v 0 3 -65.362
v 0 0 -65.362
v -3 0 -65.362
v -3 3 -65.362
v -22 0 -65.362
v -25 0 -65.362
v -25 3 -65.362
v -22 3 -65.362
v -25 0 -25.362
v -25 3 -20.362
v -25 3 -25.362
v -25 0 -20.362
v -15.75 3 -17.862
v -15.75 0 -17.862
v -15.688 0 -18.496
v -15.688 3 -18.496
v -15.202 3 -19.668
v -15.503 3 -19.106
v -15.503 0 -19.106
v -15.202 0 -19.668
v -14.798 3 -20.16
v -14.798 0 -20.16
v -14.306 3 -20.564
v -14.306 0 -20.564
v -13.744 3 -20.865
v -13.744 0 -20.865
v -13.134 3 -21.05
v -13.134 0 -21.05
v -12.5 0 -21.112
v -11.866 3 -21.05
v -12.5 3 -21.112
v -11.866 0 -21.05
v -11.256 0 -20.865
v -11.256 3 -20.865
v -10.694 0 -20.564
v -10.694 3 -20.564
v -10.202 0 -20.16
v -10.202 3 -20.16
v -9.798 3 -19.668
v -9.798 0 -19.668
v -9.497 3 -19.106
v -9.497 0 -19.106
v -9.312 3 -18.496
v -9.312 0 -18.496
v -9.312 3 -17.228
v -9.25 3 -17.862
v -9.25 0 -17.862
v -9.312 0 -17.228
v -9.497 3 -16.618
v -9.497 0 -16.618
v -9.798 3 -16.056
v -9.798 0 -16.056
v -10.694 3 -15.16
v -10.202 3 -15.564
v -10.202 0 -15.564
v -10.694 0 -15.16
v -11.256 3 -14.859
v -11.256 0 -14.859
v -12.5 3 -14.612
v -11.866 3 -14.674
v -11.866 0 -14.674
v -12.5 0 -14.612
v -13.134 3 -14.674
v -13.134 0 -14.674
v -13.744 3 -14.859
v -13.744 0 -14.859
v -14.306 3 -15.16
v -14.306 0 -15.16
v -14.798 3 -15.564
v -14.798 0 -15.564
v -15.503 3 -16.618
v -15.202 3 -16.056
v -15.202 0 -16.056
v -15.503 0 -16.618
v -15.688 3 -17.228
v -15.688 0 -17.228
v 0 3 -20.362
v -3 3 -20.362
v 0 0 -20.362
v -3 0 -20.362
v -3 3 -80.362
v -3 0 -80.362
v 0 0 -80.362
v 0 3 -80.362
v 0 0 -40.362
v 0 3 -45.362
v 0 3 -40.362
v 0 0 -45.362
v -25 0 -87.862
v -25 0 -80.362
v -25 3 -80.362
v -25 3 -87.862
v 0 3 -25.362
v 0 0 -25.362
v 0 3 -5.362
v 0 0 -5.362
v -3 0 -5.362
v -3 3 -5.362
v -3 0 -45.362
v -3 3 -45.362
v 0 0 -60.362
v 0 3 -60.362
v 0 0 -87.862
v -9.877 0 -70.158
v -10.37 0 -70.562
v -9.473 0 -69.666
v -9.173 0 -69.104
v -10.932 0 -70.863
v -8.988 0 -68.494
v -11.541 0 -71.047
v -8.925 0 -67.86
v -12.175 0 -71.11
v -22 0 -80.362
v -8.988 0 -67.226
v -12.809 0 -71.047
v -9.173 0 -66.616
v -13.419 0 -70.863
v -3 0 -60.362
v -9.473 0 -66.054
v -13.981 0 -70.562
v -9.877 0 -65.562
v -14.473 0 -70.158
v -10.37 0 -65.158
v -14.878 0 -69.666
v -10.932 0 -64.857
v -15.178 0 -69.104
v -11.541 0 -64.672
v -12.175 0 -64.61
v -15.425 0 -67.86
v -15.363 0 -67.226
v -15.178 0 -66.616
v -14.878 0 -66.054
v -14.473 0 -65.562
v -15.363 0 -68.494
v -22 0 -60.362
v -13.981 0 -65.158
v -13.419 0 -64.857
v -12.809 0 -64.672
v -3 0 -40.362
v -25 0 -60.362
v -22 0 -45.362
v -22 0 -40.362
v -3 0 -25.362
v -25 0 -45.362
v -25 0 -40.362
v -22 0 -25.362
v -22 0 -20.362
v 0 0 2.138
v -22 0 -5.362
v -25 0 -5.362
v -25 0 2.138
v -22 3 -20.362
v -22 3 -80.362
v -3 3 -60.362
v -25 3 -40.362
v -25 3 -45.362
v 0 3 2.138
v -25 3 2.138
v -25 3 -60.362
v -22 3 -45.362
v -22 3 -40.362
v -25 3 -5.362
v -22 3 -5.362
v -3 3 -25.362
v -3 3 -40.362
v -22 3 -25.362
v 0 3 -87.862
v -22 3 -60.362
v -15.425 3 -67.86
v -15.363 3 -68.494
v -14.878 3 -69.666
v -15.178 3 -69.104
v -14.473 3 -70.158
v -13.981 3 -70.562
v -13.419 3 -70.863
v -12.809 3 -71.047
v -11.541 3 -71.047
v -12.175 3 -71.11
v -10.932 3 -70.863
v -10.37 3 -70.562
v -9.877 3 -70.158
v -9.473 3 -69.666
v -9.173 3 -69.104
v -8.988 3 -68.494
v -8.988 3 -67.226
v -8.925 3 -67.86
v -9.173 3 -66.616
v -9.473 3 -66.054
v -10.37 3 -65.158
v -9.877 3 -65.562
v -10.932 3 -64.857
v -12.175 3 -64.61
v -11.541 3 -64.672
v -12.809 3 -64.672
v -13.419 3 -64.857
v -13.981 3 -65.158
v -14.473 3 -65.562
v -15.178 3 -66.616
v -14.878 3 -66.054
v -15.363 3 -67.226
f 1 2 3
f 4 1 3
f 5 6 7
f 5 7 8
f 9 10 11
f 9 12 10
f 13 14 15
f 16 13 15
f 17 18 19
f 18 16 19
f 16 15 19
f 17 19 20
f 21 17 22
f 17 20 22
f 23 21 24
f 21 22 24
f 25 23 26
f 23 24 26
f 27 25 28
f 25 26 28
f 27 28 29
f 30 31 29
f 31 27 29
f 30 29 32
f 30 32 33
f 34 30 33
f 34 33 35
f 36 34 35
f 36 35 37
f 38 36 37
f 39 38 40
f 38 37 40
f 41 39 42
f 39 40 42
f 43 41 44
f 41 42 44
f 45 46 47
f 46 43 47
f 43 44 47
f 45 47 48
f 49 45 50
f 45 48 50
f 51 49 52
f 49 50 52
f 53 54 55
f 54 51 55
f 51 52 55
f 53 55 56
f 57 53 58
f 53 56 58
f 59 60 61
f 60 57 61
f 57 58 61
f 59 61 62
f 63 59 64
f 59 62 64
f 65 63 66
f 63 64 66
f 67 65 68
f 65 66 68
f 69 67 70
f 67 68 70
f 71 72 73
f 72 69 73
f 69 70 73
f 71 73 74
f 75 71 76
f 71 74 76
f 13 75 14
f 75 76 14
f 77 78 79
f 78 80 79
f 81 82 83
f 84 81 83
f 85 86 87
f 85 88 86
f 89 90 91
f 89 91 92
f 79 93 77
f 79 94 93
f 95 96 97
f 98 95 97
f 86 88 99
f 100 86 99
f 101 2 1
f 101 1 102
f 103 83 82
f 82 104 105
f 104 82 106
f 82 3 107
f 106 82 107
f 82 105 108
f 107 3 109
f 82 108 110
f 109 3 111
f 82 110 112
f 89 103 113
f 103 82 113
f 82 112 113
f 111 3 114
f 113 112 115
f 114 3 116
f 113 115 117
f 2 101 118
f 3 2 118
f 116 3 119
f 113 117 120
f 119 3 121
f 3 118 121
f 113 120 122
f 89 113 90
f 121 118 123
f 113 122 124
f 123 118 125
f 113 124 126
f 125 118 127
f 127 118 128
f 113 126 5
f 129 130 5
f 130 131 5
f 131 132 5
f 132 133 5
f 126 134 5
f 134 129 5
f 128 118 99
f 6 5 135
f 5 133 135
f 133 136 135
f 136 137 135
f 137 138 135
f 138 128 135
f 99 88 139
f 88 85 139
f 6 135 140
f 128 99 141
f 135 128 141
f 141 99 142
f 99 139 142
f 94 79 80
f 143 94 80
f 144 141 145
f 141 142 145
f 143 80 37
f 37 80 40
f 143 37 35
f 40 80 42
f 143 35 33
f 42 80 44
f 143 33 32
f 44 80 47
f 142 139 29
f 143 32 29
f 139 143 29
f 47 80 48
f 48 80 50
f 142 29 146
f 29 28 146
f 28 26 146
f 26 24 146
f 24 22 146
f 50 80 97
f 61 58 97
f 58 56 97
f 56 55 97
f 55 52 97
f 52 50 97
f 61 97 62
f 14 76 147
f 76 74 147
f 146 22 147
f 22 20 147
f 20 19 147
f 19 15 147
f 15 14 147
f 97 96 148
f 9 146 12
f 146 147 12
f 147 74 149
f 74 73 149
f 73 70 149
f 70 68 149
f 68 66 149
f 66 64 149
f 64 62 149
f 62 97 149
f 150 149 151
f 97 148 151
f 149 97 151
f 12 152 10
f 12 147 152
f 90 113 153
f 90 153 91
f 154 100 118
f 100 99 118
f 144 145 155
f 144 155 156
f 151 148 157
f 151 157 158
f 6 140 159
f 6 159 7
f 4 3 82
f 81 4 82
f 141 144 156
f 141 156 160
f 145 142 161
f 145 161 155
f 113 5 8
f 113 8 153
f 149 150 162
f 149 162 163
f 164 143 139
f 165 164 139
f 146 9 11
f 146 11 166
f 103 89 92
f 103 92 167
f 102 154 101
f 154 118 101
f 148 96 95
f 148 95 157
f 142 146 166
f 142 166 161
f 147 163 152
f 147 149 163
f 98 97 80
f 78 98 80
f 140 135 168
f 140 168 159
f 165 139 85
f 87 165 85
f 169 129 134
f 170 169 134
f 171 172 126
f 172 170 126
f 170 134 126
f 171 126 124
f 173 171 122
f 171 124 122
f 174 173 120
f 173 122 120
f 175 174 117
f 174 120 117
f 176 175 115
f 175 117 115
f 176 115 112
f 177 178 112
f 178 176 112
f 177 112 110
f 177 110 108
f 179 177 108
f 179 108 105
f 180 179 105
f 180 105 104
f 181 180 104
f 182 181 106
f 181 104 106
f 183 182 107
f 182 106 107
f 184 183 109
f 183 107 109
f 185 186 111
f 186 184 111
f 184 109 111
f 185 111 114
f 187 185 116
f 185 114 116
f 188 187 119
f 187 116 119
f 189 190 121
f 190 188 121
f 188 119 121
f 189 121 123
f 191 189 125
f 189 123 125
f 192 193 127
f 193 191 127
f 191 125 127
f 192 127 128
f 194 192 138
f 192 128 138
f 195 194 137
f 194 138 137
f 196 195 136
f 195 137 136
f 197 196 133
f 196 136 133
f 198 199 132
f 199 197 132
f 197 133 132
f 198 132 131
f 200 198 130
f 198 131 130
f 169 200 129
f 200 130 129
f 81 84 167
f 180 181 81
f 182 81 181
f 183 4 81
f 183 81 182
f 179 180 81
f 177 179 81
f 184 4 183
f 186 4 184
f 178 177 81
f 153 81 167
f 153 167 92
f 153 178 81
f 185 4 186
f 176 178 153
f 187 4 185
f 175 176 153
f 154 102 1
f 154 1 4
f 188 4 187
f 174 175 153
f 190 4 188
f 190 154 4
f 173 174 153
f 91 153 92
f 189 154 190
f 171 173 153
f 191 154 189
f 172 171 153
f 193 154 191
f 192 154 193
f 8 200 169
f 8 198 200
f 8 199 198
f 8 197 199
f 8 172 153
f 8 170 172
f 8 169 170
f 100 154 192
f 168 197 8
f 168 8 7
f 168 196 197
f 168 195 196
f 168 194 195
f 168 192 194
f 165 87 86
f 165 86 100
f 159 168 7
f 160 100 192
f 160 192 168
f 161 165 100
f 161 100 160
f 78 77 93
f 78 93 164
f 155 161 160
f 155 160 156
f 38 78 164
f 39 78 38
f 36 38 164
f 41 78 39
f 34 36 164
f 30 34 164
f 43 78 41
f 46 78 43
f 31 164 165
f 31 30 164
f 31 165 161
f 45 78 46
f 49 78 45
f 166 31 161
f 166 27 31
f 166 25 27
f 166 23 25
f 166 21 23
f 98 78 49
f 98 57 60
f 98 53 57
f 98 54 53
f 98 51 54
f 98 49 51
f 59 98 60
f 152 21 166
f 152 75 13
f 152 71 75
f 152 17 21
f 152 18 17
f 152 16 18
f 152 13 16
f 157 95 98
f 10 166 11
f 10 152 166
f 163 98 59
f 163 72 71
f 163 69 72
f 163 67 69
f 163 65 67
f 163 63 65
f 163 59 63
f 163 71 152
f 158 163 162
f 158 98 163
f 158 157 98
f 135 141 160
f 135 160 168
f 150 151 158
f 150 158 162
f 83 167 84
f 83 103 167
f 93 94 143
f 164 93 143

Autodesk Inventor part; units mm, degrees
ref_plane "YZ Plane" through (0, 0, 0) normal (1, 0, 0) x (0, 1, 0)
ref_plane "XZ Plane" through (0, 0, 0) normal (0, 1, 0) x (-1, 0, 0)
ref_plane "XY Plane" through (0, 0, 0) normal (0, 0, 1) x (1, 0, 0)
sketch "Boceto1" plane through (0, 0, 0) normal (0, 1, 0) x (-1, 0, 0)
  line L0 (0, 2.138) -> (25, 2.138)
  line L1 (25, 2.138) -> (25, -87.862)
  line L2 (25, -87.862) -> (0, -87.862)
  line L3 (0, -87.862) -> (0, 2.138)
  line L4 (0, 2.138) -> (25, -87.862) construction
  line L5 (25, 2.138) -> (0, -87.862) construction
  circle A0 centre (12.5, -17.862) radius 3.25
  circle A1 centre (12.1754, -67.8599) radius 3.25
  line L6 (25, -5.362) -> (22, -5.362)
  line L7 (22, -5.362) -> (22, -20.362)
  line L8 (22, -20.362) -> (25, -20.362)
  line L9 (25, -20.362) -> (25, -5.362)
  line L10 (22, -40.362) -> (25, -40.362)
  line L11 (25, -25.362) -> (22, -25.362)
  line L12 (22, -25.362) -> (22, -40.362)
  line L13 (25, -40.362) -> (25, -25.362)
  line L14 (22, -60.362) -> (25, -60.362)
  line L15 (25, -45.362) -> (22, -45.362)
  line L16 (22, -45.362) -> (22, -60.362)
  line L17 (25, -60.362) -> (25, -45.362)
  line L18 (22, -80.362) -> (25, -80.362)
  line L19 (25, -65.362) -> (22, -65.362)
  line L20 (22, -65.362) -> (22, -80.362)
  line L21 (25, -80.362) -> (25, -65.362)
  line L22 (12.5, 2.138) -> (12.5, -87.862) construction
  line L23 (0, -5.362) -> (3, -5.362)
  line L24 (3, -5.362) -> (3, -20.362)
  line L25 (3, -20.362) -> (0, -20.362)
  line L26 (0, -20.362) -> (0, -5.362)
  line L27 (3, -40.362) -> (0, -40.362)
  line L28 (0, -25.362) -> (3, -25.362)
  line L29 (3, -25.362) -> (3, -40.362)
  line L30 (0, -40.362) -> (0, -25.362)
  line L31 (3, -60.362) -> (0, -60.362)
  line L32 (0, -45.362) -> (3, -45.362)
  line L33 (3, -45.362) -> (3, -60.362)
  line L34 (0, -60.362) -> (0, -45.362)
  line L35 (3, -80.362) -> (0, -80.362)
  line L36 (0, -65.362) -> (3, -65.362)
  line L37 (3, -65.362) -> (3, -80.362)
  line L38 (0, -80.362) -> (0, -65.362)
  point P0 (0, 0)
  point P1 (12.5, -50)
  point P2 (12.5, -42.862)
  point P3 (23.5, -5.362)
  point P4 (23.5, -25.362)
  point P5 (23.5, -45.362)
  point P6 (23.5, -65.362)
  point P7 (1.5, -5.362)
  point P8 (1.5, -25.362)
  point P9 (1.5, -45.362)
  point P10 (1.5, -65.362)
  point P11 (0, -5.362)
  point P12 (12.5, -42.862)
  dimension "d3" = 25
  dimension "d4" = 25
  dimension "d5" = 90
  dimension "d6" = 6.5
  dimension "d7" = 6.5
  dimension "d8" = 3
  dimension "d9" = 15
  dimension "d10" = 7.5
  dimension "d13" = 20
  dimension "d20" = 25
extrude "Extrusión1" add sketch "Boceto1" along normal blind 3 contours L0 L1 L6 L7 L8 L11 L12 L10 L15 L16 L14 L19 L20 L18 L2 L3 L35 L37 L36 L31 L33 L32 L27 L29 L28 L25 L24 L23
